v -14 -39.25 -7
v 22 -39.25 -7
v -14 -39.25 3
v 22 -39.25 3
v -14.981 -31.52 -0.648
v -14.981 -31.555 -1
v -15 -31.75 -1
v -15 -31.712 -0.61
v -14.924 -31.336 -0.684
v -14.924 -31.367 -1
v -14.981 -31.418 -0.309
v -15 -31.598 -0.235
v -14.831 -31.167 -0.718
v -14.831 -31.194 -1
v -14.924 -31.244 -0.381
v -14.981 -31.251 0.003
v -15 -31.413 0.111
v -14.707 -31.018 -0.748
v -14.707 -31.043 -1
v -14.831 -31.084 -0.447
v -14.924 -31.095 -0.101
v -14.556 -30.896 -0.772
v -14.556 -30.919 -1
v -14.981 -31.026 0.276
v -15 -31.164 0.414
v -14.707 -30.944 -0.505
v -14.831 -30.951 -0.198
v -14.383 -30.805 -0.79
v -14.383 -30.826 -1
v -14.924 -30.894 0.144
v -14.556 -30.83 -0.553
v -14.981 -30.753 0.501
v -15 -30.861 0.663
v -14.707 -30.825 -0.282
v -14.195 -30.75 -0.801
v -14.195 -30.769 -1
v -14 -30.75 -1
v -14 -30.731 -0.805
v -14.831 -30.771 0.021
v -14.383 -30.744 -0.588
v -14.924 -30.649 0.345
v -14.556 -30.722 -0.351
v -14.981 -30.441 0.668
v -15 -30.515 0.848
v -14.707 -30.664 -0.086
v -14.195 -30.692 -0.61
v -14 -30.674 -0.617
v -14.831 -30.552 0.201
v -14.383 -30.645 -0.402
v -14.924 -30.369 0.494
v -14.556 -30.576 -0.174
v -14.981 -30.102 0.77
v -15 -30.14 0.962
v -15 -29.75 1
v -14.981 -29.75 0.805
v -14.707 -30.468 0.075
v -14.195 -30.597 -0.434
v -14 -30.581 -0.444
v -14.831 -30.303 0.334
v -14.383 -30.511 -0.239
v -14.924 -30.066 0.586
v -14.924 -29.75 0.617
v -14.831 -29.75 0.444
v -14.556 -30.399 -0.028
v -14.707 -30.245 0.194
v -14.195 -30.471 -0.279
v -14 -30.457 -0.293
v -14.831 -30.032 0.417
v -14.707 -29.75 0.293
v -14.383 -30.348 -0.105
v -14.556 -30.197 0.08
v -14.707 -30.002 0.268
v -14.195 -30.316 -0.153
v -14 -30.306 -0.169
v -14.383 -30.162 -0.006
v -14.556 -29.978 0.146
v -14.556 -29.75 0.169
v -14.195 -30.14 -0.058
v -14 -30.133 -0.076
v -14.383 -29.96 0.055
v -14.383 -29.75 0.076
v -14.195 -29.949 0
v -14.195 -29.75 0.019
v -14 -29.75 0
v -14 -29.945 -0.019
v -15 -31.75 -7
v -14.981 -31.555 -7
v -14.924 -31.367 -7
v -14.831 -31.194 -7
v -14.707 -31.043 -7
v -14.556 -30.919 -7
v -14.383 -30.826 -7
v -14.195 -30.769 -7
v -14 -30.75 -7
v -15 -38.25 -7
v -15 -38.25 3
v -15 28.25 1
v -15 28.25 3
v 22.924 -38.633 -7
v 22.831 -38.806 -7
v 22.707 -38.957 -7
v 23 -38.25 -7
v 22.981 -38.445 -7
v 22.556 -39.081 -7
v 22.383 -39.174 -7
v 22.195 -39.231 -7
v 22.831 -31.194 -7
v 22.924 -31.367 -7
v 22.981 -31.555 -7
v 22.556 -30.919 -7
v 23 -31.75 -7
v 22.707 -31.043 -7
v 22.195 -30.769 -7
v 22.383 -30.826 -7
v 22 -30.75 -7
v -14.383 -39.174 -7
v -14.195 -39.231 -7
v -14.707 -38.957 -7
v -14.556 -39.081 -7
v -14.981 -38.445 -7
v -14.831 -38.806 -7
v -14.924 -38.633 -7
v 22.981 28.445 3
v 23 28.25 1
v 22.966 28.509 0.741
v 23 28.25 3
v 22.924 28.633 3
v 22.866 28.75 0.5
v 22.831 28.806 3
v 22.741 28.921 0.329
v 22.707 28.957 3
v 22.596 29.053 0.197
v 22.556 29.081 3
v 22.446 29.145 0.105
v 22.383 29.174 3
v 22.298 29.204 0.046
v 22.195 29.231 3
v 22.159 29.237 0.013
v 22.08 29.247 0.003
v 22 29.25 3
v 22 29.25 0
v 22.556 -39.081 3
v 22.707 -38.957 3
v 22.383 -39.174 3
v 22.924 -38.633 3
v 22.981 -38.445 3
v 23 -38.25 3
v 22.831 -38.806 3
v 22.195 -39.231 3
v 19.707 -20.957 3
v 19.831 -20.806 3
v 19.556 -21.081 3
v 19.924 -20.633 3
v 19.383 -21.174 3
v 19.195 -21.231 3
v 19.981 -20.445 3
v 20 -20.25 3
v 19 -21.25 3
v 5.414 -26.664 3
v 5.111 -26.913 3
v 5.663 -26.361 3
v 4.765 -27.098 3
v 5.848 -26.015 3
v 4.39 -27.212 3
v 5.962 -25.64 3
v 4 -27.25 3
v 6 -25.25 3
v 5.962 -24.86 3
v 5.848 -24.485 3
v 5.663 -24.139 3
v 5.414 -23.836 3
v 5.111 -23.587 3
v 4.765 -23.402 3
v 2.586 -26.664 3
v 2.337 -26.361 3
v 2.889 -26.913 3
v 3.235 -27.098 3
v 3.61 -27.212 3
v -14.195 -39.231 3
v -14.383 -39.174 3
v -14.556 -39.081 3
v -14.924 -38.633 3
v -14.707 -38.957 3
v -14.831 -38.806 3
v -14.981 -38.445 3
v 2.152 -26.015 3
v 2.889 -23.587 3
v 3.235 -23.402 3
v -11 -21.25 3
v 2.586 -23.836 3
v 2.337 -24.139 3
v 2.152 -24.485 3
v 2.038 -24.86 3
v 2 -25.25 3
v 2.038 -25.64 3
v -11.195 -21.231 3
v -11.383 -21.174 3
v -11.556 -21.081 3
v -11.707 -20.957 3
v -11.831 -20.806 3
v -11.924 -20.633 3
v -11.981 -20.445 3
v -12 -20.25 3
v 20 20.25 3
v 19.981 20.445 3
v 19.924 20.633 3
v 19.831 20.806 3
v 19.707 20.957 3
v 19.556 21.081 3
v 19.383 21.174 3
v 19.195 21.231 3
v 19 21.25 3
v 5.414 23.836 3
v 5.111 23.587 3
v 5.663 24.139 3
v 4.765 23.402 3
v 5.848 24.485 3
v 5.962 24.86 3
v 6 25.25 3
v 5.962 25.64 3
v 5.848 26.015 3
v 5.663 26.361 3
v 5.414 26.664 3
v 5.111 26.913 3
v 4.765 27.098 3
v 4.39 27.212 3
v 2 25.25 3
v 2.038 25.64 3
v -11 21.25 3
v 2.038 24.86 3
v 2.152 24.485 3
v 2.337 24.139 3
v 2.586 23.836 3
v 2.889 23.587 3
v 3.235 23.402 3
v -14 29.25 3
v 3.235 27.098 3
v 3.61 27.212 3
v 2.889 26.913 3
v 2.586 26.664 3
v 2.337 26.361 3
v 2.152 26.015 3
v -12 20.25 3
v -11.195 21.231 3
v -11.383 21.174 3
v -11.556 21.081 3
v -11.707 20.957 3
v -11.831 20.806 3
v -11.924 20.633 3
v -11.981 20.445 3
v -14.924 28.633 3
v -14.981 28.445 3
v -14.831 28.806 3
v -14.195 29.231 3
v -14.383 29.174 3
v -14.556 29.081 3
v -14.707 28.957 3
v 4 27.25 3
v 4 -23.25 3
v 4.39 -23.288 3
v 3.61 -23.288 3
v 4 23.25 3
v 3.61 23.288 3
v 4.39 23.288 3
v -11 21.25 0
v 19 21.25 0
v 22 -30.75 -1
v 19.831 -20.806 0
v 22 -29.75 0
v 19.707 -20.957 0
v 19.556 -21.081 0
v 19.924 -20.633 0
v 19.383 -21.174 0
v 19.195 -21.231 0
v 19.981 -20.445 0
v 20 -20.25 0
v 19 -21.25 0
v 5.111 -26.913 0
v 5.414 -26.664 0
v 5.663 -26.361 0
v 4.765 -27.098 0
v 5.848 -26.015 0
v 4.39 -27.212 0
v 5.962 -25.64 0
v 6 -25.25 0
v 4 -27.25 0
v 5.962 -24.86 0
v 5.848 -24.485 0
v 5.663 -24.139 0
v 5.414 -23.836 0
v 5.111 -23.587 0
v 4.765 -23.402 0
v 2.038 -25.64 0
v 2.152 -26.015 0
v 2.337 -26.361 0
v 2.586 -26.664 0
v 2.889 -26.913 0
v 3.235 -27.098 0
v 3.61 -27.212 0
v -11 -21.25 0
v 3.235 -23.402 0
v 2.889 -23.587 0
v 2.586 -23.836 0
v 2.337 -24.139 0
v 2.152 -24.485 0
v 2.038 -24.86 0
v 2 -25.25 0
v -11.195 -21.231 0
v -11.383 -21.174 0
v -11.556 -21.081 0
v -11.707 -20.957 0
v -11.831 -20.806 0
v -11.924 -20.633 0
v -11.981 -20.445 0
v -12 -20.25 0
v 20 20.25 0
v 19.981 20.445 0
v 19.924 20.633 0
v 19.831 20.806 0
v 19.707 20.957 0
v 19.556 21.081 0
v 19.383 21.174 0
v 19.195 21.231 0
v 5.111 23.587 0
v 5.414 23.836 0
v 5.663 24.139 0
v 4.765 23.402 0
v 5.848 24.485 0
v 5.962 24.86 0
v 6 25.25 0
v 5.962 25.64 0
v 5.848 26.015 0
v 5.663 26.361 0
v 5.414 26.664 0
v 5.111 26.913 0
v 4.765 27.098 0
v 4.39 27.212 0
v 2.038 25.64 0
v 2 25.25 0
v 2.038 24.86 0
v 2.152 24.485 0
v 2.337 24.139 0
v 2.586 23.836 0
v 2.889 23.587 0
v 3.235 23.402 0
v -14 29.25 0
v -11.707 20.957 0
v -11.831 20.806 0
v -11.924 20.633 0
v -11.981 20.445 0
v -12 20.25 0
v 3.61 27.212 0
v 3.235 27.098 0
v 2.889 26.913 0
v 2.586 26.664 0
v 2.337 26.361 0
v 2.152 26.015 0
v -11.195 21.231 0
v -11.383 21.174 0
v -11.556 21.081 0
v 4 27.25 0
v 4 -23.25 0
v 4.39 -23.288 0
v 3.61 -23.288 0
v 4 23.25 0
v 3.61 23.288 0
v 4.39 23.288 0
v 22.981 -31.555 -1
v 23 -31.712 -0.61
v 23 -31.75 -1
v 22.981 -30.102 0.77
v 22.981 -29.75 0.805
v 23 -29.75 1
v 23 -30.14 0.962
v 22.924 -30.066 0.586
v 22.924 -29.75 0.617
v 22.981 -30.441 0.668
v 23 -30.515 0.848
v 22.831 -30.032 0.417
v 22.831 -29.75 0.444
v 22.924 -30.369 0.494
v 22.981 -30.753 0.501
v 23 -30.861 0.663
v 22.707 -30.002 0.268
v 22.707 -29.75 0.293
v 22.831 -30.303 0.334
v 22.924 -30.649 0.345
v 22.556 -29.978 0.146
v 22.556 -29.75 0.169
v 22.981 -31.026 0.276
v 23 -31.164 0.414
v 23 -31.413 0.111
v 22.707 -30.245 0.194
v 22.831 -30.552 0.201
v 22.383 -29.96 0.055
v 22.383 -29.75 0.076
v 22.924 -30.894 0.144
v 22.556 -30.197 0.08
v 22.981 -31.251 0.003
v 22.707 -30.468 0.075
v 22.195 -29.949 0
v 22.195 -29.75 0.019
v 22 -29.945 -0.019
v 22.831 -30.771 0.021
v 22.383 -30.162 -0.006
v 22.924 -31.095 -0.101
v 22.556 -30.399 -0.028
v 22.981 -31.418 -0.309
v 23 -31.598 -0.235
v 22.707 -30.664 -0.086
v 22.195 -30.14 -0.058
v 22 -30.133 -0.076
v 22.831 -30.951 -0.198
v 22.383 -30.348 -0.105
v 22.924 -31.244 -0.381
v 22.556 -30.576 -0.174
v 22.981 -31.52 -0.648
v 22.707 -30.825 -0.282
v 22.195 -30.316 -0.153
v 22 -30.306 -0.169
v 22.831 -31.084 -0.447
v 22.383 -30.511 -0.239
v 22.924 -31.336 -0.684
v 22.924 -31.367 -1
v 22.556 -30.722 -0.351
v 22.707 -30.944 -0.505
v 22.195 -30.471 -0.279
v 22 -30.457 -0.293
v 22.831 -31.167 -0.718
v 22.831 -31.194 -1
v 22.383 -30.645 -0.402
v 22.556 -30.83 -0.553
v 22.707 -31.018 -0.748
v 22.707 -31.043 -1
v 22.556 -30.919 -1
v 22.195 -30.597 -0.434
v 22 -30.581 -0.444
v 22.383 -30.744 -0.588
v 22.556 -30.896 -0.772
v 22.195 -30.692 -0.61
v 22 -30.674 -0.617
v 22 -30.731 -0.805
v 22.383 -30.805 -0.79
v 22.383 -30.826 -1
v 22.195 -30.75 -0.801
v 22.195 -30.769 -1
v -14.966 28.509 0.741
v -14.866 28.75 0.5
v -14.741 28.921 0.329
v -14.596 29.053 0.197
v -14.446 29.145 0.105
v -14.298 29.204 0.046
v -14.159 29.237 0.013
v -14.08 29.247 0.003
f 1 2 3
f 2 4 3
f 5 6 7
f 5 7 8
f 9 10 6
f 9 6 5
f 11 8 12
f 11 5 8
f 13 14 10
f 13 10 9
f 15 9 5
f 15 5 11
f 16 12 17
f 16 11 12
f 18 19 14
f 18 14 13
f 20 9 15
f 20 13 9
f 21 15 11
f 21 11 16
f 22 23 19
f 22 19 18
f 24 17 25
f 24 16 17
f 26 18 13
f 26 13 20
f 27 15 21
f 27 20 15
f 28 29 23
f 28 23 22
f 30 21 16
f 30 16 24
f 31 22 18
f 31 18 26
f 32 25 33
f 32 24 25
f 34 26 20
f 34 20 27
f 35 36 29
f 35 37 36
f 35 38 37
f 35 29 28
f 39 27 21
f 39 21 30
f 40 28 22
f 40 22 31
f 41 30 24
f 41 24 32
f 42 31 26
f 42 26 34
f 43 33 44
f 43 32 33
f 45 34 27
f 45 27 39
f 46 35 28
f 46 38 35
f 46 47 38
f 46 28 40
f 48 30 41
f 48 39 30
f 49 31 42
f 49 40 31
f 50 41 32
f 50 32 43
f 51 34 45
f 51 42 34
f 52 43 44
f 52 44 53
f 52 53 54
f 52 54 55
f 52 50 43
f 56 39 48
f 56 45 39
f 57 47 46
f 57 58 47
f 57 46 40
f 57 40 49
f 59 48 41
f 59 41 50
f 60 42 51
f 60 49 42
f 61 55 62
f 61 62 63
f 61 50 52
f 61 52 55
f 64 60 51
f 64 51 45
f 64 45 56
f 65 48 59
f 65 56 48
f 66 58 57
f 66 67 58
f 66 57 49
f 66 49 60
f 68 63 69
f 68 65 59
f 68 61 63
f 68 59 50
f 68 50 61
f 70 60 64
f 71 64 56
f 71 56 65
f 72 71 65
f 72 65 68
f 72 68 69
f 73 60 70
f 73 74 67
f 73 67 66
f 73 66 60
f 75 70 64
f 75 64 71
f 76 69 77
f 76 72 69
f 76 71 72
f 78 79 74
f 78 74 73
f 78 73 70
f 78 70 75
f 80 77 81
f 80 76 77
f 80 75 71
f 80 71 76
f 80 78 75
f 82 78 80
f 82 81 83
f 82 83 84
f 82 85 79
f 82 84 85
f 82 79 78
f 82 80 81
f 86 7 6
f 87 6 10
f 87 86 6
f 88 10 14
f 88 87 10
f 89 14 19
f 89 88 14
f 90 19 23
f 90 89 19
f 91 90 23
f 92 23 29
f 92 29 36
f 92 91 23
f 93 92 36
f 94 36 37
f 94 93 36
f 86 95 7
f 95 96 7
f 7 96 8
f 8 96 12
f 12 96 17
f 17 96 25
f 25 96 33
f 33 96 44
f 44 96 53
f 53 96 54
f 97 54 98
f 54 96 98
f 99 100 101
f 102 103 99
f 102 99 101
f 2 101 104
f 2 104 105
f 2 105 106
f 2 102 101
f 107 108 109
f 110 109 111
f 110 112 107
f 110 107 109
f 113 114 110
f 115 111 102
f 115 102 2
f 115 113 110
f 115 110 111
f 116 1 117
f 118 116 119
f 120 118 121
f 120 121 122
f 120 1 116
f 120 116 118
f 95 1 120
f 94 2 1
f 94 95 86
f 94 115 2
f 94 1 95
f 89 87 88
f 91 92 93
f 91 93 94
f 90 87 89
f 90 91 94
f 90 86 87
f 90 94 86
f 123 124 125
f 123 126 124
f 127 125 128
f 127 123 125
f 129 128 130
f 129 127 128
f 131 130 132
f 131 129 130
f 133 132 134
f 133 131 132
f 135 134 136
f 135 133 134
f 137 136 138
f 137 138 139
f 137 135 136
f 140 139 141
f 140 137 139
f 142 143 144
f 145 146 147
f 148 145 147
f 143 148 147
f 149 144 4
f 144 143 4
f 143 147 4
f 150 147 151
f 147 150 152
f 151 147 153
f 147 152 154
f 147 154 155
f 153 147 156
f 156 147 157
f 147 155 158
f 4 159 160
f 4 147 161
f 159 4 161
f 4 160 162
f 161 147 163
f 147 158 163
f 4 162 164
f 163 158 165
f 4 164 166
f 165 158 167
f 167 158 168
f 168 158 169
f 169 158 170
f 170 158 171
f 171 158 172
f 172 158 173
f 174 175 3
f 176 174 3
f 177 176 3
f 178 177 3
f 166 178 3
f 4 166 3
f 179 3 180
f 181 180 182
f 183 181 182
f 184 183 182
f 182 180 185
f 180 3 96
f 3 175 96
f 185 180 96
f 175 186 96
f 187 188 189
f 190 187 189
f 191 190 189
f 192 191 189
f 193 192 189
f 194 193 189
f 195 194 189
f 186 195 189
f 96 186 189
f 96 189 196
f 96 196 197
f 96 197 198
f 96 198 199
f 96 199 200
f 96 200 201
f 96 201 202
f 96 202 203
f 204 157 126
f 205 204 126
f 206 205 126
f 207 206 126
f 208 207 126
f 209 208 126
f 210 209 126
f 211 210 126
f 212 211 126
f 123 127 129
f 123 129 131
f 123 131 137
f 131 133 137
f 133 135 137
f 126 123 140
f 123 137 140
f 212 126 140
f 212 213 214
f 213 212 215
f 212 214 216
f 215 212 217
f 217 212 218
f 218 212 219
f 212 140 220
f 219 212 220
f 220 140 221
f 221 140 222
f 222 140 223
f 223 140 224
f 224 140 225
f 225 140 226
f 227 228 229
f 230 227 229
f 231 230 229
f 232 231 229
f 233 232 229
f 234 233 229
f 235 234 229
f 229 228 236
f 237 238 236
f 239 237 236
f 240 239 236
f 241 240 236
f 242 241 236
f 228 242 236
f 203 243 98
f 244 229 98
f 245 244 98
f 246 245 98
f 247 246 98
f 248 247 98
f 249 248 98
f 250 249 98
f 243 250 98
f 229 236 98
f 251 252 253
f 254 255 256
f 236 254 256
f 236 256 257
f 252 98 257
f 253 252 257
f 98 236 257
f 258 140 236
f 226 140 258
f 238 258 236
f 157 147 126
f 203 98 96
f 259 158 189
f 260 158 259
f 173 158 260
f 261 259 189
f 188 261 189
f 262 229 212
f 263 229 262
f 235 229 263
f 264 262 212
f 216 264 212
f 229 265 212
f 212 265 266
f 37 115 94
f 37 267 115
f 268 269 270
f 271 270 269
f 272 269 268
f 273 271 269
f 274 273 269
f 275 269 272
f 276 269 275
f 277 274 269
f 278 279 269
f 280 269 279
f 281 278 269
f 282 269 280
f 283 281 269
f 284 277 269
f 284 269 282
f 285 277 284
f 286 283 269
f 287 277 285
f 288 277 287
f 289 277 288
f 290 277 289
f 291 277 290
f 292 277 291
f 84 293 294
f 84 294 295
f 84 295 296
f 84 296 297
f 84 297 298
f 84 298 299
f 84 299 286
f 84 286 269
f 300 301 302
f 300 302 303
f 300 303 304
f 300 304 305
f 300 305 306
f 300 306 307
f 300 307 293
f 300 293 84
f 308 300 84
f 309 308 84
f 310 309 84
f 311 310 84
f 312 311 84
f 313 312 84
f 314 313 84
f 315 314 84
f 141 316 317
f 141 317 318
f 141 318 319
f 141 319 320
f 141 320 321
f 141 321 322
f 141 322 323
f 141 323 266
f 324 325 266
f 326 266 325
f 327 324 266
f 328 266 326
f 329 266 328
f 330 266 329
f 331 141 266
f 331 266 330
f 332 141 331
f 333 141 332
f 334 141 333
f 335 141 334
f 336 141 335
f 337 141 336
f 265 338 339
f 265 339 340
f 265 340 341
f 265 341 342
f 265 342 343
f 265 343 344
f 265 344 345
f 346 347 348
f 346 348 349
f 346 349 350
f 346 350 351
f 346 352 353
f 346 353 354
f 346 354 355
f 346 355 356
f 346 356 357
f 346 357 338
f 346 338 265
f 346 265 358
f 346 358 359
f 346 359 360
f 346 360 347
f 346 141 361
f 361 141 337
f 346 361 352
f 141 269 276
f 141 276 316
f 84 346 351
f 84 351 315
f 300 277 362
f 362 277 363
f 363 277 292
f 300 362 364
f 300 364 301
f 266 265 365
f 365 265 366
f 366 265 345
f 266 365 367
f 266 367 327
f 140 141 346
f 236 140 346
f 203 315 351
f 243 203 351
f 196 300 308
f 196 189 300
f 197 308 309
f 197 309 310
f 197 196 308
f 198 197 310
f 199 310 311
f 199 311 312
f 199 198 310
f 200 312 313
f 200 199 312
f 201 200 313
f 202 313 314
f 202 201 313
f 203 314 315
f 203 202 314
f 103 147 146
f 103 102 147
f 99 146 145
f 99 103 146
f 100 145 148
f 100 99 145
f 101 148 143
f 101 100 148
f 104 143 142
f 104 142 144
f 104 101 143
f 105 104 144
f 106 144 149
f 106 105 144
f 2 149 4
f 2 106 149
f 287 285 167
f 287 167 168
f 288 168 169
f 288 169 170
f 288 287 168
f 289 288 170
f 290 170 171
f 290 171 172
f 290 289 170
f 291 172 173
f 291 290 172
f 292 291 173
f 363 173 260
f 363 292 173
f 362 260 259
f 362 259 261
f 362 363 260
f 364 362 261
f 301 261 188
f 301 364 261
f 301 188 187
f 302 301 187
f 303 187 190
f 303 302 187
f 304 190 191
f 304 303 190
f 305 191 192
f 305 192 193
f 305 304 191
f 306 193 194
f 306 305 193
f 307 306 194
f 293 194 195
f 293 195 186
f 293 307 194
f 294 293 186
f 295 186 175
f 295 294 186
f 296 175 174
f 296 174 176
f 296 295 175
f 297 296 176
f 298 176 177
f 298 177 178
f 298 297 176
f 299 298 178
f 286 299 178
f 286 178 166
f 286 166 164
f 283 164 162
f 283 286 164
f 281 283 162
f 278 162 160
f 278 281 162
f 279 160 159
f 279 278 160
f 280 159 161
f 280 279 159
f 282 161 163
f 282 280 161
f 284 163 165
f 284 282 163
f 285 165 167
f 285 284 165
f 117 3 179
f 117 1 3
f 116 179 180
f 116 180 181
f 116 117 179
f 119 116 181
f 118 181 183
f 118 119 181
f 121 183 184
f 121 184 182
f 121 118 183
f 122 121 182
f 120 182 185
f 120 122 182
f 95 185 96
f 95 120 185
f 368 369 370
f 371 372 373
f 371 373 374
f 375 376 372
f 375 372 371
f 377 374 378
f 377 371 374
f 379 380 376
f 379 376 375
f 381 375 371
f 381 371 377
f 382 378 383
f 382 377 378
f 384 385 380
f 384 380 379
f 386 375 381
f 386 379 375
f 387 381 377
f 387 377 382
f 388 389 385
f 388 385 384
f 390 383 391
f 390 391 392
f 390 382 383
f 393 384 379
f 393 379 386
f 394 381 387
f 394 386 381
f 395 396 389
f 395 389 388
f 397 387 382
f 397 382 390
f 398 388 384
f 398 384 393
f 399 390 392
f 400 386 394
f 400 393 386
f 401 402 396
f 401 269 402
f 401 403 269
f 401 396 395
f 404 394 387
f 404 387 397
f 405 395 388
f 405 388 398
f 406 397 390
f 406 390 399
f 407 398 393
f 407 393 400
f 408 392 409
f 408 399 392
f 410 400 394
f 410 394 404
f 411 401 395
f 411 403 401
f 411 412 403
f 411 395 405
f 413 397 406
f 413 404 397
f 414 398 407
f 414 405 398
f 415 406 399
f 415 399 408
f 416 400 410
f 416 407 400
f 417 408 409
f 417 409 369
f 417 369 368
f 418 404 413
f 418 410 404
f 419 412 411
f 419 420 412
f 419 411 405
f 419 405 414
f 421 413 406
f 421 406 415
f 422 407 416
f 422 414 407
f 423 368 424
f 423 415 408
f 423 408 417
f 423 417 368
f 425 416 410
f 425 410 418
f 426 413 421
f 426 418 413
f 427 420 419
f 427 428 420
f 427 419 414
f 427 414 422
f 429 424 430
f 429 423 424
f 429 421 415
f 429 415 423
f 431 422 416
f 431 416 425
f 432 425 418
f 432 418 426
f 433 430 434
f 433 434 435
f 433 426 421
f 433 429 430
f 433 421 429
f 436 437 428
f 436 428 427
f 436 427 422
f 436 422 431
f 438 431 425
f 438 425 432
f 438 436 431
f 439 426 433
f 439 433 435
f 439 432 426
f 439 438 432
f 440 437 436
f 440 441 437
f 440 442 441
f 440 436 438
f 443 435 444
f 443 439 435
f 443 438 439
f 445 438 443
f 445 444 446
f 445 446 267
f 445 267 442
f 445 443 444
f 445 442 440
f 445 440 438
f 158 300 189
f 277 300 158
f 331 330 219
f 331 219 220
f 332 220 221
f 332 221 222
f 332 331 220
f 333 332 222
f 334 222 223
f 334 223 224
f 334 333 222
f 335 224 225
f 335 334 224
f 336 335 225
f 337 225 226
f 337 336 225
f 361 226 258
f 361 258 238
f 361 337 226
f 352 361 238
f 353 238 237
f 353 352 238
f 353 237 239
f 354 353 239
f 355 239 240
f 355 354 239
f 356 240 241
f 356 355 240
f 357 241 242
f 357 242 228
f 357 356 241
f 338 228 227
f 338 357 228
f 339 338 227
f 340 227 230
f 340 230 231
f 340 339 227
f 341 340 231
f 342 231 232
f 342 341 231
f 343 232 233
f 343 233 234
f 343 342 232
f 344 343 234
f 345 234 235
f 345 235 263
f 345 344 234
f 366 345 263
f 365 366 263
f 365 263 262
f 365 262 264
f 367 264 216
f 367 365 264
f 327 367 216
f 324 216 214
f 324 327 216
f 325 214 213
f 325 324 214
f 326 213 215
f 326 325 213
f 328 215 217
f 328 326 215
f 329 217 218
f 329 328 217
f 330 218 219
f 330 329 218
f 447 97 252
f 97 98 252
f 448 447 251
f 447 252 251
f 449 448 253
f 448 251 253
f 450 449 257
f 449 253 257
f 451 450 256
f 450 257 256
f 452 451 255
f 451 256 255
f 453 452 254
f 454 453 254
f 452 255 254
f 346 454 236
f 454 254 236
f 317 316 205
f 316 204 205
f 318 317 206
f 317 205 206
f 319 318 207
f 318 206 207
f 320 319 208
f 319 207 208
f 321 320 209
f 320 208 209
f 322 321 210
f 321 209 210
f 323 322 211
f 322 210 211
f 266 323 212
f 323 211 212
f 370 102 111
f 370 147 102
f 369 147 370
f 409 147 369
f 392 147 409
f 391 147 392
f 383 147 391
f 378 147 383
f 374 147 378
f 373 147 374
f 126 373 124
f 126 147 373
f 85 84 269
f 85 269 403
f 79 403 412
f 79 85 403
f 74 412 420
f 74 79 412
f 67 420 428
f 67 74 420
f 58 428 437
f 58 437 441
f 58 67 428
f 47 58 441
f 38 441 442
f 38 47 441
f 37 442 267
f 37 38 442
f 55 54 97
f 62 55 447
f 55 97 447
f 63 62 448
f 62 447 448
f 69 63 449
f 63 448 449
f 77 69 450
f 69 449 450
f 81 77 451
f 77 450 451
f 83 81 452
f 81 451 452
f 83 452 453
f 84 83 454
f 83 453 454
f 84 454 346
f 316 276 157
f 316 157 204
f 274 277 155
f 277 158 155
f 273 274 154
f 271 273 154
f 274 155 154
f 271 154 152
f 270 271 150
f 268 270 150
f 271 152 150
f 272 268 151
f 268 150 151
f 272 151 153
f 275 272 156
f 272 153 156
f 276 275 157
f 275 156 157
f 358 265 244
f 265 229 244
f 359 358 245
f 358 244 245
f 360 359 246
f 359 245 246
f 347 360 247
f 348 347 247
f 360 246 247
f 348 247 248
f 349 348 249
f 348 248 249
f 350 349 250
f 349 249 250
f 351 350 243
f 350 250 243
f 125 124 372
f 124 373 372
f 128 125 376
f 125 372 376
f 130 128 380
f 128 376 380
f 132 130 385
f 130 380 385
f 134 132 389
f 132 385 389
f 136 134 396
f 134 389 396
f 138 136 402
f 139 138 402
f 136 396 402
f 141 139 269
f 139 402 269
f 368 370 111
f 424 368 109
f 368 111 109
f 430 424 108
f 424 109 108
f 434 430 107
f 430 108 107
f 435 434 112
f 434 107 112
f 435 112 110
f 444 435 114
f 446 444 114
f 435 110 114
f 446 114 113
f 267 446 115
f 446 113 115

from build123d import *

# Parameters (mm, degrees)
SKETCH_1_R      = 2
SKETCH_1_W      = 32
SKETCH_1_H      = 42.5
EXTRUDE_1_DEPTH = 3
SKETCH_2_W      = 38
SKETCH_2_H      = 8.5
EXTRUDE_2_DEPTH = 7
FILLET_1_R      = 1


with BuildPart() as part:
    # 草图1 → 凸台-拉伸1 (new body)
    with BuildSketch(Plane.XY):
        Polygon((0, 29.25), (23, 29.25), (23, -39.25), (-15, -39.25), (-15, 29.25), align=None)
        with Locations((4, 25.25)):
            Circle(SKETCH_1_R, mode=Mode.SUBTRACT)
        with Locations((4, -25.25)):
            Circle(SKETCH_1_R, mode=Mode.SUBTRACT)
        with Locations((4, 0)):
            Rectangle(SKETCH_1_W, SKETCH_1_H, mode=Mode.SUBTRACT)
    extrude(amount=EXTRUDE_1_DEPTH)

    # 草图2 → 凸台-拉伸2 (add)
    with BuildSketch(Plane(origin=(0, 0, 0), x_dir=(-1, 0, 0), z_dir=(0, 0, -1))):
        with Locations((-4, -35)):
            Rectangle(SKETCH_2_W, SKETCH_2_H)
    extrude(amount=EXTRUDE_2_DEPTH)

    # 圆角1
    fillet_1_edges = [part.edges().sort_by_distance(p)[0] for p in [
        (-12, -21.25, 1.5),
        (20, -21.25, 1.5),
        (20, 21.25, 1.5),
        (-12, 21.25, 1.5),
        (23, -0.75, 0),
        (23, -30.75, -3.5),
        (4, -30.75, 0),
        (-15, -30.75, -3.5),
        (-15, -0.75, 0),
        (-15, -39.25, -2),
        (-15, 29.25, 1.5),
        (23, 29.25, 1.5),
        (23, -39.25, -2),
    ]]
    fillet(fillet_1_edges, radius=FILLET_1_R)


solid = part.part
